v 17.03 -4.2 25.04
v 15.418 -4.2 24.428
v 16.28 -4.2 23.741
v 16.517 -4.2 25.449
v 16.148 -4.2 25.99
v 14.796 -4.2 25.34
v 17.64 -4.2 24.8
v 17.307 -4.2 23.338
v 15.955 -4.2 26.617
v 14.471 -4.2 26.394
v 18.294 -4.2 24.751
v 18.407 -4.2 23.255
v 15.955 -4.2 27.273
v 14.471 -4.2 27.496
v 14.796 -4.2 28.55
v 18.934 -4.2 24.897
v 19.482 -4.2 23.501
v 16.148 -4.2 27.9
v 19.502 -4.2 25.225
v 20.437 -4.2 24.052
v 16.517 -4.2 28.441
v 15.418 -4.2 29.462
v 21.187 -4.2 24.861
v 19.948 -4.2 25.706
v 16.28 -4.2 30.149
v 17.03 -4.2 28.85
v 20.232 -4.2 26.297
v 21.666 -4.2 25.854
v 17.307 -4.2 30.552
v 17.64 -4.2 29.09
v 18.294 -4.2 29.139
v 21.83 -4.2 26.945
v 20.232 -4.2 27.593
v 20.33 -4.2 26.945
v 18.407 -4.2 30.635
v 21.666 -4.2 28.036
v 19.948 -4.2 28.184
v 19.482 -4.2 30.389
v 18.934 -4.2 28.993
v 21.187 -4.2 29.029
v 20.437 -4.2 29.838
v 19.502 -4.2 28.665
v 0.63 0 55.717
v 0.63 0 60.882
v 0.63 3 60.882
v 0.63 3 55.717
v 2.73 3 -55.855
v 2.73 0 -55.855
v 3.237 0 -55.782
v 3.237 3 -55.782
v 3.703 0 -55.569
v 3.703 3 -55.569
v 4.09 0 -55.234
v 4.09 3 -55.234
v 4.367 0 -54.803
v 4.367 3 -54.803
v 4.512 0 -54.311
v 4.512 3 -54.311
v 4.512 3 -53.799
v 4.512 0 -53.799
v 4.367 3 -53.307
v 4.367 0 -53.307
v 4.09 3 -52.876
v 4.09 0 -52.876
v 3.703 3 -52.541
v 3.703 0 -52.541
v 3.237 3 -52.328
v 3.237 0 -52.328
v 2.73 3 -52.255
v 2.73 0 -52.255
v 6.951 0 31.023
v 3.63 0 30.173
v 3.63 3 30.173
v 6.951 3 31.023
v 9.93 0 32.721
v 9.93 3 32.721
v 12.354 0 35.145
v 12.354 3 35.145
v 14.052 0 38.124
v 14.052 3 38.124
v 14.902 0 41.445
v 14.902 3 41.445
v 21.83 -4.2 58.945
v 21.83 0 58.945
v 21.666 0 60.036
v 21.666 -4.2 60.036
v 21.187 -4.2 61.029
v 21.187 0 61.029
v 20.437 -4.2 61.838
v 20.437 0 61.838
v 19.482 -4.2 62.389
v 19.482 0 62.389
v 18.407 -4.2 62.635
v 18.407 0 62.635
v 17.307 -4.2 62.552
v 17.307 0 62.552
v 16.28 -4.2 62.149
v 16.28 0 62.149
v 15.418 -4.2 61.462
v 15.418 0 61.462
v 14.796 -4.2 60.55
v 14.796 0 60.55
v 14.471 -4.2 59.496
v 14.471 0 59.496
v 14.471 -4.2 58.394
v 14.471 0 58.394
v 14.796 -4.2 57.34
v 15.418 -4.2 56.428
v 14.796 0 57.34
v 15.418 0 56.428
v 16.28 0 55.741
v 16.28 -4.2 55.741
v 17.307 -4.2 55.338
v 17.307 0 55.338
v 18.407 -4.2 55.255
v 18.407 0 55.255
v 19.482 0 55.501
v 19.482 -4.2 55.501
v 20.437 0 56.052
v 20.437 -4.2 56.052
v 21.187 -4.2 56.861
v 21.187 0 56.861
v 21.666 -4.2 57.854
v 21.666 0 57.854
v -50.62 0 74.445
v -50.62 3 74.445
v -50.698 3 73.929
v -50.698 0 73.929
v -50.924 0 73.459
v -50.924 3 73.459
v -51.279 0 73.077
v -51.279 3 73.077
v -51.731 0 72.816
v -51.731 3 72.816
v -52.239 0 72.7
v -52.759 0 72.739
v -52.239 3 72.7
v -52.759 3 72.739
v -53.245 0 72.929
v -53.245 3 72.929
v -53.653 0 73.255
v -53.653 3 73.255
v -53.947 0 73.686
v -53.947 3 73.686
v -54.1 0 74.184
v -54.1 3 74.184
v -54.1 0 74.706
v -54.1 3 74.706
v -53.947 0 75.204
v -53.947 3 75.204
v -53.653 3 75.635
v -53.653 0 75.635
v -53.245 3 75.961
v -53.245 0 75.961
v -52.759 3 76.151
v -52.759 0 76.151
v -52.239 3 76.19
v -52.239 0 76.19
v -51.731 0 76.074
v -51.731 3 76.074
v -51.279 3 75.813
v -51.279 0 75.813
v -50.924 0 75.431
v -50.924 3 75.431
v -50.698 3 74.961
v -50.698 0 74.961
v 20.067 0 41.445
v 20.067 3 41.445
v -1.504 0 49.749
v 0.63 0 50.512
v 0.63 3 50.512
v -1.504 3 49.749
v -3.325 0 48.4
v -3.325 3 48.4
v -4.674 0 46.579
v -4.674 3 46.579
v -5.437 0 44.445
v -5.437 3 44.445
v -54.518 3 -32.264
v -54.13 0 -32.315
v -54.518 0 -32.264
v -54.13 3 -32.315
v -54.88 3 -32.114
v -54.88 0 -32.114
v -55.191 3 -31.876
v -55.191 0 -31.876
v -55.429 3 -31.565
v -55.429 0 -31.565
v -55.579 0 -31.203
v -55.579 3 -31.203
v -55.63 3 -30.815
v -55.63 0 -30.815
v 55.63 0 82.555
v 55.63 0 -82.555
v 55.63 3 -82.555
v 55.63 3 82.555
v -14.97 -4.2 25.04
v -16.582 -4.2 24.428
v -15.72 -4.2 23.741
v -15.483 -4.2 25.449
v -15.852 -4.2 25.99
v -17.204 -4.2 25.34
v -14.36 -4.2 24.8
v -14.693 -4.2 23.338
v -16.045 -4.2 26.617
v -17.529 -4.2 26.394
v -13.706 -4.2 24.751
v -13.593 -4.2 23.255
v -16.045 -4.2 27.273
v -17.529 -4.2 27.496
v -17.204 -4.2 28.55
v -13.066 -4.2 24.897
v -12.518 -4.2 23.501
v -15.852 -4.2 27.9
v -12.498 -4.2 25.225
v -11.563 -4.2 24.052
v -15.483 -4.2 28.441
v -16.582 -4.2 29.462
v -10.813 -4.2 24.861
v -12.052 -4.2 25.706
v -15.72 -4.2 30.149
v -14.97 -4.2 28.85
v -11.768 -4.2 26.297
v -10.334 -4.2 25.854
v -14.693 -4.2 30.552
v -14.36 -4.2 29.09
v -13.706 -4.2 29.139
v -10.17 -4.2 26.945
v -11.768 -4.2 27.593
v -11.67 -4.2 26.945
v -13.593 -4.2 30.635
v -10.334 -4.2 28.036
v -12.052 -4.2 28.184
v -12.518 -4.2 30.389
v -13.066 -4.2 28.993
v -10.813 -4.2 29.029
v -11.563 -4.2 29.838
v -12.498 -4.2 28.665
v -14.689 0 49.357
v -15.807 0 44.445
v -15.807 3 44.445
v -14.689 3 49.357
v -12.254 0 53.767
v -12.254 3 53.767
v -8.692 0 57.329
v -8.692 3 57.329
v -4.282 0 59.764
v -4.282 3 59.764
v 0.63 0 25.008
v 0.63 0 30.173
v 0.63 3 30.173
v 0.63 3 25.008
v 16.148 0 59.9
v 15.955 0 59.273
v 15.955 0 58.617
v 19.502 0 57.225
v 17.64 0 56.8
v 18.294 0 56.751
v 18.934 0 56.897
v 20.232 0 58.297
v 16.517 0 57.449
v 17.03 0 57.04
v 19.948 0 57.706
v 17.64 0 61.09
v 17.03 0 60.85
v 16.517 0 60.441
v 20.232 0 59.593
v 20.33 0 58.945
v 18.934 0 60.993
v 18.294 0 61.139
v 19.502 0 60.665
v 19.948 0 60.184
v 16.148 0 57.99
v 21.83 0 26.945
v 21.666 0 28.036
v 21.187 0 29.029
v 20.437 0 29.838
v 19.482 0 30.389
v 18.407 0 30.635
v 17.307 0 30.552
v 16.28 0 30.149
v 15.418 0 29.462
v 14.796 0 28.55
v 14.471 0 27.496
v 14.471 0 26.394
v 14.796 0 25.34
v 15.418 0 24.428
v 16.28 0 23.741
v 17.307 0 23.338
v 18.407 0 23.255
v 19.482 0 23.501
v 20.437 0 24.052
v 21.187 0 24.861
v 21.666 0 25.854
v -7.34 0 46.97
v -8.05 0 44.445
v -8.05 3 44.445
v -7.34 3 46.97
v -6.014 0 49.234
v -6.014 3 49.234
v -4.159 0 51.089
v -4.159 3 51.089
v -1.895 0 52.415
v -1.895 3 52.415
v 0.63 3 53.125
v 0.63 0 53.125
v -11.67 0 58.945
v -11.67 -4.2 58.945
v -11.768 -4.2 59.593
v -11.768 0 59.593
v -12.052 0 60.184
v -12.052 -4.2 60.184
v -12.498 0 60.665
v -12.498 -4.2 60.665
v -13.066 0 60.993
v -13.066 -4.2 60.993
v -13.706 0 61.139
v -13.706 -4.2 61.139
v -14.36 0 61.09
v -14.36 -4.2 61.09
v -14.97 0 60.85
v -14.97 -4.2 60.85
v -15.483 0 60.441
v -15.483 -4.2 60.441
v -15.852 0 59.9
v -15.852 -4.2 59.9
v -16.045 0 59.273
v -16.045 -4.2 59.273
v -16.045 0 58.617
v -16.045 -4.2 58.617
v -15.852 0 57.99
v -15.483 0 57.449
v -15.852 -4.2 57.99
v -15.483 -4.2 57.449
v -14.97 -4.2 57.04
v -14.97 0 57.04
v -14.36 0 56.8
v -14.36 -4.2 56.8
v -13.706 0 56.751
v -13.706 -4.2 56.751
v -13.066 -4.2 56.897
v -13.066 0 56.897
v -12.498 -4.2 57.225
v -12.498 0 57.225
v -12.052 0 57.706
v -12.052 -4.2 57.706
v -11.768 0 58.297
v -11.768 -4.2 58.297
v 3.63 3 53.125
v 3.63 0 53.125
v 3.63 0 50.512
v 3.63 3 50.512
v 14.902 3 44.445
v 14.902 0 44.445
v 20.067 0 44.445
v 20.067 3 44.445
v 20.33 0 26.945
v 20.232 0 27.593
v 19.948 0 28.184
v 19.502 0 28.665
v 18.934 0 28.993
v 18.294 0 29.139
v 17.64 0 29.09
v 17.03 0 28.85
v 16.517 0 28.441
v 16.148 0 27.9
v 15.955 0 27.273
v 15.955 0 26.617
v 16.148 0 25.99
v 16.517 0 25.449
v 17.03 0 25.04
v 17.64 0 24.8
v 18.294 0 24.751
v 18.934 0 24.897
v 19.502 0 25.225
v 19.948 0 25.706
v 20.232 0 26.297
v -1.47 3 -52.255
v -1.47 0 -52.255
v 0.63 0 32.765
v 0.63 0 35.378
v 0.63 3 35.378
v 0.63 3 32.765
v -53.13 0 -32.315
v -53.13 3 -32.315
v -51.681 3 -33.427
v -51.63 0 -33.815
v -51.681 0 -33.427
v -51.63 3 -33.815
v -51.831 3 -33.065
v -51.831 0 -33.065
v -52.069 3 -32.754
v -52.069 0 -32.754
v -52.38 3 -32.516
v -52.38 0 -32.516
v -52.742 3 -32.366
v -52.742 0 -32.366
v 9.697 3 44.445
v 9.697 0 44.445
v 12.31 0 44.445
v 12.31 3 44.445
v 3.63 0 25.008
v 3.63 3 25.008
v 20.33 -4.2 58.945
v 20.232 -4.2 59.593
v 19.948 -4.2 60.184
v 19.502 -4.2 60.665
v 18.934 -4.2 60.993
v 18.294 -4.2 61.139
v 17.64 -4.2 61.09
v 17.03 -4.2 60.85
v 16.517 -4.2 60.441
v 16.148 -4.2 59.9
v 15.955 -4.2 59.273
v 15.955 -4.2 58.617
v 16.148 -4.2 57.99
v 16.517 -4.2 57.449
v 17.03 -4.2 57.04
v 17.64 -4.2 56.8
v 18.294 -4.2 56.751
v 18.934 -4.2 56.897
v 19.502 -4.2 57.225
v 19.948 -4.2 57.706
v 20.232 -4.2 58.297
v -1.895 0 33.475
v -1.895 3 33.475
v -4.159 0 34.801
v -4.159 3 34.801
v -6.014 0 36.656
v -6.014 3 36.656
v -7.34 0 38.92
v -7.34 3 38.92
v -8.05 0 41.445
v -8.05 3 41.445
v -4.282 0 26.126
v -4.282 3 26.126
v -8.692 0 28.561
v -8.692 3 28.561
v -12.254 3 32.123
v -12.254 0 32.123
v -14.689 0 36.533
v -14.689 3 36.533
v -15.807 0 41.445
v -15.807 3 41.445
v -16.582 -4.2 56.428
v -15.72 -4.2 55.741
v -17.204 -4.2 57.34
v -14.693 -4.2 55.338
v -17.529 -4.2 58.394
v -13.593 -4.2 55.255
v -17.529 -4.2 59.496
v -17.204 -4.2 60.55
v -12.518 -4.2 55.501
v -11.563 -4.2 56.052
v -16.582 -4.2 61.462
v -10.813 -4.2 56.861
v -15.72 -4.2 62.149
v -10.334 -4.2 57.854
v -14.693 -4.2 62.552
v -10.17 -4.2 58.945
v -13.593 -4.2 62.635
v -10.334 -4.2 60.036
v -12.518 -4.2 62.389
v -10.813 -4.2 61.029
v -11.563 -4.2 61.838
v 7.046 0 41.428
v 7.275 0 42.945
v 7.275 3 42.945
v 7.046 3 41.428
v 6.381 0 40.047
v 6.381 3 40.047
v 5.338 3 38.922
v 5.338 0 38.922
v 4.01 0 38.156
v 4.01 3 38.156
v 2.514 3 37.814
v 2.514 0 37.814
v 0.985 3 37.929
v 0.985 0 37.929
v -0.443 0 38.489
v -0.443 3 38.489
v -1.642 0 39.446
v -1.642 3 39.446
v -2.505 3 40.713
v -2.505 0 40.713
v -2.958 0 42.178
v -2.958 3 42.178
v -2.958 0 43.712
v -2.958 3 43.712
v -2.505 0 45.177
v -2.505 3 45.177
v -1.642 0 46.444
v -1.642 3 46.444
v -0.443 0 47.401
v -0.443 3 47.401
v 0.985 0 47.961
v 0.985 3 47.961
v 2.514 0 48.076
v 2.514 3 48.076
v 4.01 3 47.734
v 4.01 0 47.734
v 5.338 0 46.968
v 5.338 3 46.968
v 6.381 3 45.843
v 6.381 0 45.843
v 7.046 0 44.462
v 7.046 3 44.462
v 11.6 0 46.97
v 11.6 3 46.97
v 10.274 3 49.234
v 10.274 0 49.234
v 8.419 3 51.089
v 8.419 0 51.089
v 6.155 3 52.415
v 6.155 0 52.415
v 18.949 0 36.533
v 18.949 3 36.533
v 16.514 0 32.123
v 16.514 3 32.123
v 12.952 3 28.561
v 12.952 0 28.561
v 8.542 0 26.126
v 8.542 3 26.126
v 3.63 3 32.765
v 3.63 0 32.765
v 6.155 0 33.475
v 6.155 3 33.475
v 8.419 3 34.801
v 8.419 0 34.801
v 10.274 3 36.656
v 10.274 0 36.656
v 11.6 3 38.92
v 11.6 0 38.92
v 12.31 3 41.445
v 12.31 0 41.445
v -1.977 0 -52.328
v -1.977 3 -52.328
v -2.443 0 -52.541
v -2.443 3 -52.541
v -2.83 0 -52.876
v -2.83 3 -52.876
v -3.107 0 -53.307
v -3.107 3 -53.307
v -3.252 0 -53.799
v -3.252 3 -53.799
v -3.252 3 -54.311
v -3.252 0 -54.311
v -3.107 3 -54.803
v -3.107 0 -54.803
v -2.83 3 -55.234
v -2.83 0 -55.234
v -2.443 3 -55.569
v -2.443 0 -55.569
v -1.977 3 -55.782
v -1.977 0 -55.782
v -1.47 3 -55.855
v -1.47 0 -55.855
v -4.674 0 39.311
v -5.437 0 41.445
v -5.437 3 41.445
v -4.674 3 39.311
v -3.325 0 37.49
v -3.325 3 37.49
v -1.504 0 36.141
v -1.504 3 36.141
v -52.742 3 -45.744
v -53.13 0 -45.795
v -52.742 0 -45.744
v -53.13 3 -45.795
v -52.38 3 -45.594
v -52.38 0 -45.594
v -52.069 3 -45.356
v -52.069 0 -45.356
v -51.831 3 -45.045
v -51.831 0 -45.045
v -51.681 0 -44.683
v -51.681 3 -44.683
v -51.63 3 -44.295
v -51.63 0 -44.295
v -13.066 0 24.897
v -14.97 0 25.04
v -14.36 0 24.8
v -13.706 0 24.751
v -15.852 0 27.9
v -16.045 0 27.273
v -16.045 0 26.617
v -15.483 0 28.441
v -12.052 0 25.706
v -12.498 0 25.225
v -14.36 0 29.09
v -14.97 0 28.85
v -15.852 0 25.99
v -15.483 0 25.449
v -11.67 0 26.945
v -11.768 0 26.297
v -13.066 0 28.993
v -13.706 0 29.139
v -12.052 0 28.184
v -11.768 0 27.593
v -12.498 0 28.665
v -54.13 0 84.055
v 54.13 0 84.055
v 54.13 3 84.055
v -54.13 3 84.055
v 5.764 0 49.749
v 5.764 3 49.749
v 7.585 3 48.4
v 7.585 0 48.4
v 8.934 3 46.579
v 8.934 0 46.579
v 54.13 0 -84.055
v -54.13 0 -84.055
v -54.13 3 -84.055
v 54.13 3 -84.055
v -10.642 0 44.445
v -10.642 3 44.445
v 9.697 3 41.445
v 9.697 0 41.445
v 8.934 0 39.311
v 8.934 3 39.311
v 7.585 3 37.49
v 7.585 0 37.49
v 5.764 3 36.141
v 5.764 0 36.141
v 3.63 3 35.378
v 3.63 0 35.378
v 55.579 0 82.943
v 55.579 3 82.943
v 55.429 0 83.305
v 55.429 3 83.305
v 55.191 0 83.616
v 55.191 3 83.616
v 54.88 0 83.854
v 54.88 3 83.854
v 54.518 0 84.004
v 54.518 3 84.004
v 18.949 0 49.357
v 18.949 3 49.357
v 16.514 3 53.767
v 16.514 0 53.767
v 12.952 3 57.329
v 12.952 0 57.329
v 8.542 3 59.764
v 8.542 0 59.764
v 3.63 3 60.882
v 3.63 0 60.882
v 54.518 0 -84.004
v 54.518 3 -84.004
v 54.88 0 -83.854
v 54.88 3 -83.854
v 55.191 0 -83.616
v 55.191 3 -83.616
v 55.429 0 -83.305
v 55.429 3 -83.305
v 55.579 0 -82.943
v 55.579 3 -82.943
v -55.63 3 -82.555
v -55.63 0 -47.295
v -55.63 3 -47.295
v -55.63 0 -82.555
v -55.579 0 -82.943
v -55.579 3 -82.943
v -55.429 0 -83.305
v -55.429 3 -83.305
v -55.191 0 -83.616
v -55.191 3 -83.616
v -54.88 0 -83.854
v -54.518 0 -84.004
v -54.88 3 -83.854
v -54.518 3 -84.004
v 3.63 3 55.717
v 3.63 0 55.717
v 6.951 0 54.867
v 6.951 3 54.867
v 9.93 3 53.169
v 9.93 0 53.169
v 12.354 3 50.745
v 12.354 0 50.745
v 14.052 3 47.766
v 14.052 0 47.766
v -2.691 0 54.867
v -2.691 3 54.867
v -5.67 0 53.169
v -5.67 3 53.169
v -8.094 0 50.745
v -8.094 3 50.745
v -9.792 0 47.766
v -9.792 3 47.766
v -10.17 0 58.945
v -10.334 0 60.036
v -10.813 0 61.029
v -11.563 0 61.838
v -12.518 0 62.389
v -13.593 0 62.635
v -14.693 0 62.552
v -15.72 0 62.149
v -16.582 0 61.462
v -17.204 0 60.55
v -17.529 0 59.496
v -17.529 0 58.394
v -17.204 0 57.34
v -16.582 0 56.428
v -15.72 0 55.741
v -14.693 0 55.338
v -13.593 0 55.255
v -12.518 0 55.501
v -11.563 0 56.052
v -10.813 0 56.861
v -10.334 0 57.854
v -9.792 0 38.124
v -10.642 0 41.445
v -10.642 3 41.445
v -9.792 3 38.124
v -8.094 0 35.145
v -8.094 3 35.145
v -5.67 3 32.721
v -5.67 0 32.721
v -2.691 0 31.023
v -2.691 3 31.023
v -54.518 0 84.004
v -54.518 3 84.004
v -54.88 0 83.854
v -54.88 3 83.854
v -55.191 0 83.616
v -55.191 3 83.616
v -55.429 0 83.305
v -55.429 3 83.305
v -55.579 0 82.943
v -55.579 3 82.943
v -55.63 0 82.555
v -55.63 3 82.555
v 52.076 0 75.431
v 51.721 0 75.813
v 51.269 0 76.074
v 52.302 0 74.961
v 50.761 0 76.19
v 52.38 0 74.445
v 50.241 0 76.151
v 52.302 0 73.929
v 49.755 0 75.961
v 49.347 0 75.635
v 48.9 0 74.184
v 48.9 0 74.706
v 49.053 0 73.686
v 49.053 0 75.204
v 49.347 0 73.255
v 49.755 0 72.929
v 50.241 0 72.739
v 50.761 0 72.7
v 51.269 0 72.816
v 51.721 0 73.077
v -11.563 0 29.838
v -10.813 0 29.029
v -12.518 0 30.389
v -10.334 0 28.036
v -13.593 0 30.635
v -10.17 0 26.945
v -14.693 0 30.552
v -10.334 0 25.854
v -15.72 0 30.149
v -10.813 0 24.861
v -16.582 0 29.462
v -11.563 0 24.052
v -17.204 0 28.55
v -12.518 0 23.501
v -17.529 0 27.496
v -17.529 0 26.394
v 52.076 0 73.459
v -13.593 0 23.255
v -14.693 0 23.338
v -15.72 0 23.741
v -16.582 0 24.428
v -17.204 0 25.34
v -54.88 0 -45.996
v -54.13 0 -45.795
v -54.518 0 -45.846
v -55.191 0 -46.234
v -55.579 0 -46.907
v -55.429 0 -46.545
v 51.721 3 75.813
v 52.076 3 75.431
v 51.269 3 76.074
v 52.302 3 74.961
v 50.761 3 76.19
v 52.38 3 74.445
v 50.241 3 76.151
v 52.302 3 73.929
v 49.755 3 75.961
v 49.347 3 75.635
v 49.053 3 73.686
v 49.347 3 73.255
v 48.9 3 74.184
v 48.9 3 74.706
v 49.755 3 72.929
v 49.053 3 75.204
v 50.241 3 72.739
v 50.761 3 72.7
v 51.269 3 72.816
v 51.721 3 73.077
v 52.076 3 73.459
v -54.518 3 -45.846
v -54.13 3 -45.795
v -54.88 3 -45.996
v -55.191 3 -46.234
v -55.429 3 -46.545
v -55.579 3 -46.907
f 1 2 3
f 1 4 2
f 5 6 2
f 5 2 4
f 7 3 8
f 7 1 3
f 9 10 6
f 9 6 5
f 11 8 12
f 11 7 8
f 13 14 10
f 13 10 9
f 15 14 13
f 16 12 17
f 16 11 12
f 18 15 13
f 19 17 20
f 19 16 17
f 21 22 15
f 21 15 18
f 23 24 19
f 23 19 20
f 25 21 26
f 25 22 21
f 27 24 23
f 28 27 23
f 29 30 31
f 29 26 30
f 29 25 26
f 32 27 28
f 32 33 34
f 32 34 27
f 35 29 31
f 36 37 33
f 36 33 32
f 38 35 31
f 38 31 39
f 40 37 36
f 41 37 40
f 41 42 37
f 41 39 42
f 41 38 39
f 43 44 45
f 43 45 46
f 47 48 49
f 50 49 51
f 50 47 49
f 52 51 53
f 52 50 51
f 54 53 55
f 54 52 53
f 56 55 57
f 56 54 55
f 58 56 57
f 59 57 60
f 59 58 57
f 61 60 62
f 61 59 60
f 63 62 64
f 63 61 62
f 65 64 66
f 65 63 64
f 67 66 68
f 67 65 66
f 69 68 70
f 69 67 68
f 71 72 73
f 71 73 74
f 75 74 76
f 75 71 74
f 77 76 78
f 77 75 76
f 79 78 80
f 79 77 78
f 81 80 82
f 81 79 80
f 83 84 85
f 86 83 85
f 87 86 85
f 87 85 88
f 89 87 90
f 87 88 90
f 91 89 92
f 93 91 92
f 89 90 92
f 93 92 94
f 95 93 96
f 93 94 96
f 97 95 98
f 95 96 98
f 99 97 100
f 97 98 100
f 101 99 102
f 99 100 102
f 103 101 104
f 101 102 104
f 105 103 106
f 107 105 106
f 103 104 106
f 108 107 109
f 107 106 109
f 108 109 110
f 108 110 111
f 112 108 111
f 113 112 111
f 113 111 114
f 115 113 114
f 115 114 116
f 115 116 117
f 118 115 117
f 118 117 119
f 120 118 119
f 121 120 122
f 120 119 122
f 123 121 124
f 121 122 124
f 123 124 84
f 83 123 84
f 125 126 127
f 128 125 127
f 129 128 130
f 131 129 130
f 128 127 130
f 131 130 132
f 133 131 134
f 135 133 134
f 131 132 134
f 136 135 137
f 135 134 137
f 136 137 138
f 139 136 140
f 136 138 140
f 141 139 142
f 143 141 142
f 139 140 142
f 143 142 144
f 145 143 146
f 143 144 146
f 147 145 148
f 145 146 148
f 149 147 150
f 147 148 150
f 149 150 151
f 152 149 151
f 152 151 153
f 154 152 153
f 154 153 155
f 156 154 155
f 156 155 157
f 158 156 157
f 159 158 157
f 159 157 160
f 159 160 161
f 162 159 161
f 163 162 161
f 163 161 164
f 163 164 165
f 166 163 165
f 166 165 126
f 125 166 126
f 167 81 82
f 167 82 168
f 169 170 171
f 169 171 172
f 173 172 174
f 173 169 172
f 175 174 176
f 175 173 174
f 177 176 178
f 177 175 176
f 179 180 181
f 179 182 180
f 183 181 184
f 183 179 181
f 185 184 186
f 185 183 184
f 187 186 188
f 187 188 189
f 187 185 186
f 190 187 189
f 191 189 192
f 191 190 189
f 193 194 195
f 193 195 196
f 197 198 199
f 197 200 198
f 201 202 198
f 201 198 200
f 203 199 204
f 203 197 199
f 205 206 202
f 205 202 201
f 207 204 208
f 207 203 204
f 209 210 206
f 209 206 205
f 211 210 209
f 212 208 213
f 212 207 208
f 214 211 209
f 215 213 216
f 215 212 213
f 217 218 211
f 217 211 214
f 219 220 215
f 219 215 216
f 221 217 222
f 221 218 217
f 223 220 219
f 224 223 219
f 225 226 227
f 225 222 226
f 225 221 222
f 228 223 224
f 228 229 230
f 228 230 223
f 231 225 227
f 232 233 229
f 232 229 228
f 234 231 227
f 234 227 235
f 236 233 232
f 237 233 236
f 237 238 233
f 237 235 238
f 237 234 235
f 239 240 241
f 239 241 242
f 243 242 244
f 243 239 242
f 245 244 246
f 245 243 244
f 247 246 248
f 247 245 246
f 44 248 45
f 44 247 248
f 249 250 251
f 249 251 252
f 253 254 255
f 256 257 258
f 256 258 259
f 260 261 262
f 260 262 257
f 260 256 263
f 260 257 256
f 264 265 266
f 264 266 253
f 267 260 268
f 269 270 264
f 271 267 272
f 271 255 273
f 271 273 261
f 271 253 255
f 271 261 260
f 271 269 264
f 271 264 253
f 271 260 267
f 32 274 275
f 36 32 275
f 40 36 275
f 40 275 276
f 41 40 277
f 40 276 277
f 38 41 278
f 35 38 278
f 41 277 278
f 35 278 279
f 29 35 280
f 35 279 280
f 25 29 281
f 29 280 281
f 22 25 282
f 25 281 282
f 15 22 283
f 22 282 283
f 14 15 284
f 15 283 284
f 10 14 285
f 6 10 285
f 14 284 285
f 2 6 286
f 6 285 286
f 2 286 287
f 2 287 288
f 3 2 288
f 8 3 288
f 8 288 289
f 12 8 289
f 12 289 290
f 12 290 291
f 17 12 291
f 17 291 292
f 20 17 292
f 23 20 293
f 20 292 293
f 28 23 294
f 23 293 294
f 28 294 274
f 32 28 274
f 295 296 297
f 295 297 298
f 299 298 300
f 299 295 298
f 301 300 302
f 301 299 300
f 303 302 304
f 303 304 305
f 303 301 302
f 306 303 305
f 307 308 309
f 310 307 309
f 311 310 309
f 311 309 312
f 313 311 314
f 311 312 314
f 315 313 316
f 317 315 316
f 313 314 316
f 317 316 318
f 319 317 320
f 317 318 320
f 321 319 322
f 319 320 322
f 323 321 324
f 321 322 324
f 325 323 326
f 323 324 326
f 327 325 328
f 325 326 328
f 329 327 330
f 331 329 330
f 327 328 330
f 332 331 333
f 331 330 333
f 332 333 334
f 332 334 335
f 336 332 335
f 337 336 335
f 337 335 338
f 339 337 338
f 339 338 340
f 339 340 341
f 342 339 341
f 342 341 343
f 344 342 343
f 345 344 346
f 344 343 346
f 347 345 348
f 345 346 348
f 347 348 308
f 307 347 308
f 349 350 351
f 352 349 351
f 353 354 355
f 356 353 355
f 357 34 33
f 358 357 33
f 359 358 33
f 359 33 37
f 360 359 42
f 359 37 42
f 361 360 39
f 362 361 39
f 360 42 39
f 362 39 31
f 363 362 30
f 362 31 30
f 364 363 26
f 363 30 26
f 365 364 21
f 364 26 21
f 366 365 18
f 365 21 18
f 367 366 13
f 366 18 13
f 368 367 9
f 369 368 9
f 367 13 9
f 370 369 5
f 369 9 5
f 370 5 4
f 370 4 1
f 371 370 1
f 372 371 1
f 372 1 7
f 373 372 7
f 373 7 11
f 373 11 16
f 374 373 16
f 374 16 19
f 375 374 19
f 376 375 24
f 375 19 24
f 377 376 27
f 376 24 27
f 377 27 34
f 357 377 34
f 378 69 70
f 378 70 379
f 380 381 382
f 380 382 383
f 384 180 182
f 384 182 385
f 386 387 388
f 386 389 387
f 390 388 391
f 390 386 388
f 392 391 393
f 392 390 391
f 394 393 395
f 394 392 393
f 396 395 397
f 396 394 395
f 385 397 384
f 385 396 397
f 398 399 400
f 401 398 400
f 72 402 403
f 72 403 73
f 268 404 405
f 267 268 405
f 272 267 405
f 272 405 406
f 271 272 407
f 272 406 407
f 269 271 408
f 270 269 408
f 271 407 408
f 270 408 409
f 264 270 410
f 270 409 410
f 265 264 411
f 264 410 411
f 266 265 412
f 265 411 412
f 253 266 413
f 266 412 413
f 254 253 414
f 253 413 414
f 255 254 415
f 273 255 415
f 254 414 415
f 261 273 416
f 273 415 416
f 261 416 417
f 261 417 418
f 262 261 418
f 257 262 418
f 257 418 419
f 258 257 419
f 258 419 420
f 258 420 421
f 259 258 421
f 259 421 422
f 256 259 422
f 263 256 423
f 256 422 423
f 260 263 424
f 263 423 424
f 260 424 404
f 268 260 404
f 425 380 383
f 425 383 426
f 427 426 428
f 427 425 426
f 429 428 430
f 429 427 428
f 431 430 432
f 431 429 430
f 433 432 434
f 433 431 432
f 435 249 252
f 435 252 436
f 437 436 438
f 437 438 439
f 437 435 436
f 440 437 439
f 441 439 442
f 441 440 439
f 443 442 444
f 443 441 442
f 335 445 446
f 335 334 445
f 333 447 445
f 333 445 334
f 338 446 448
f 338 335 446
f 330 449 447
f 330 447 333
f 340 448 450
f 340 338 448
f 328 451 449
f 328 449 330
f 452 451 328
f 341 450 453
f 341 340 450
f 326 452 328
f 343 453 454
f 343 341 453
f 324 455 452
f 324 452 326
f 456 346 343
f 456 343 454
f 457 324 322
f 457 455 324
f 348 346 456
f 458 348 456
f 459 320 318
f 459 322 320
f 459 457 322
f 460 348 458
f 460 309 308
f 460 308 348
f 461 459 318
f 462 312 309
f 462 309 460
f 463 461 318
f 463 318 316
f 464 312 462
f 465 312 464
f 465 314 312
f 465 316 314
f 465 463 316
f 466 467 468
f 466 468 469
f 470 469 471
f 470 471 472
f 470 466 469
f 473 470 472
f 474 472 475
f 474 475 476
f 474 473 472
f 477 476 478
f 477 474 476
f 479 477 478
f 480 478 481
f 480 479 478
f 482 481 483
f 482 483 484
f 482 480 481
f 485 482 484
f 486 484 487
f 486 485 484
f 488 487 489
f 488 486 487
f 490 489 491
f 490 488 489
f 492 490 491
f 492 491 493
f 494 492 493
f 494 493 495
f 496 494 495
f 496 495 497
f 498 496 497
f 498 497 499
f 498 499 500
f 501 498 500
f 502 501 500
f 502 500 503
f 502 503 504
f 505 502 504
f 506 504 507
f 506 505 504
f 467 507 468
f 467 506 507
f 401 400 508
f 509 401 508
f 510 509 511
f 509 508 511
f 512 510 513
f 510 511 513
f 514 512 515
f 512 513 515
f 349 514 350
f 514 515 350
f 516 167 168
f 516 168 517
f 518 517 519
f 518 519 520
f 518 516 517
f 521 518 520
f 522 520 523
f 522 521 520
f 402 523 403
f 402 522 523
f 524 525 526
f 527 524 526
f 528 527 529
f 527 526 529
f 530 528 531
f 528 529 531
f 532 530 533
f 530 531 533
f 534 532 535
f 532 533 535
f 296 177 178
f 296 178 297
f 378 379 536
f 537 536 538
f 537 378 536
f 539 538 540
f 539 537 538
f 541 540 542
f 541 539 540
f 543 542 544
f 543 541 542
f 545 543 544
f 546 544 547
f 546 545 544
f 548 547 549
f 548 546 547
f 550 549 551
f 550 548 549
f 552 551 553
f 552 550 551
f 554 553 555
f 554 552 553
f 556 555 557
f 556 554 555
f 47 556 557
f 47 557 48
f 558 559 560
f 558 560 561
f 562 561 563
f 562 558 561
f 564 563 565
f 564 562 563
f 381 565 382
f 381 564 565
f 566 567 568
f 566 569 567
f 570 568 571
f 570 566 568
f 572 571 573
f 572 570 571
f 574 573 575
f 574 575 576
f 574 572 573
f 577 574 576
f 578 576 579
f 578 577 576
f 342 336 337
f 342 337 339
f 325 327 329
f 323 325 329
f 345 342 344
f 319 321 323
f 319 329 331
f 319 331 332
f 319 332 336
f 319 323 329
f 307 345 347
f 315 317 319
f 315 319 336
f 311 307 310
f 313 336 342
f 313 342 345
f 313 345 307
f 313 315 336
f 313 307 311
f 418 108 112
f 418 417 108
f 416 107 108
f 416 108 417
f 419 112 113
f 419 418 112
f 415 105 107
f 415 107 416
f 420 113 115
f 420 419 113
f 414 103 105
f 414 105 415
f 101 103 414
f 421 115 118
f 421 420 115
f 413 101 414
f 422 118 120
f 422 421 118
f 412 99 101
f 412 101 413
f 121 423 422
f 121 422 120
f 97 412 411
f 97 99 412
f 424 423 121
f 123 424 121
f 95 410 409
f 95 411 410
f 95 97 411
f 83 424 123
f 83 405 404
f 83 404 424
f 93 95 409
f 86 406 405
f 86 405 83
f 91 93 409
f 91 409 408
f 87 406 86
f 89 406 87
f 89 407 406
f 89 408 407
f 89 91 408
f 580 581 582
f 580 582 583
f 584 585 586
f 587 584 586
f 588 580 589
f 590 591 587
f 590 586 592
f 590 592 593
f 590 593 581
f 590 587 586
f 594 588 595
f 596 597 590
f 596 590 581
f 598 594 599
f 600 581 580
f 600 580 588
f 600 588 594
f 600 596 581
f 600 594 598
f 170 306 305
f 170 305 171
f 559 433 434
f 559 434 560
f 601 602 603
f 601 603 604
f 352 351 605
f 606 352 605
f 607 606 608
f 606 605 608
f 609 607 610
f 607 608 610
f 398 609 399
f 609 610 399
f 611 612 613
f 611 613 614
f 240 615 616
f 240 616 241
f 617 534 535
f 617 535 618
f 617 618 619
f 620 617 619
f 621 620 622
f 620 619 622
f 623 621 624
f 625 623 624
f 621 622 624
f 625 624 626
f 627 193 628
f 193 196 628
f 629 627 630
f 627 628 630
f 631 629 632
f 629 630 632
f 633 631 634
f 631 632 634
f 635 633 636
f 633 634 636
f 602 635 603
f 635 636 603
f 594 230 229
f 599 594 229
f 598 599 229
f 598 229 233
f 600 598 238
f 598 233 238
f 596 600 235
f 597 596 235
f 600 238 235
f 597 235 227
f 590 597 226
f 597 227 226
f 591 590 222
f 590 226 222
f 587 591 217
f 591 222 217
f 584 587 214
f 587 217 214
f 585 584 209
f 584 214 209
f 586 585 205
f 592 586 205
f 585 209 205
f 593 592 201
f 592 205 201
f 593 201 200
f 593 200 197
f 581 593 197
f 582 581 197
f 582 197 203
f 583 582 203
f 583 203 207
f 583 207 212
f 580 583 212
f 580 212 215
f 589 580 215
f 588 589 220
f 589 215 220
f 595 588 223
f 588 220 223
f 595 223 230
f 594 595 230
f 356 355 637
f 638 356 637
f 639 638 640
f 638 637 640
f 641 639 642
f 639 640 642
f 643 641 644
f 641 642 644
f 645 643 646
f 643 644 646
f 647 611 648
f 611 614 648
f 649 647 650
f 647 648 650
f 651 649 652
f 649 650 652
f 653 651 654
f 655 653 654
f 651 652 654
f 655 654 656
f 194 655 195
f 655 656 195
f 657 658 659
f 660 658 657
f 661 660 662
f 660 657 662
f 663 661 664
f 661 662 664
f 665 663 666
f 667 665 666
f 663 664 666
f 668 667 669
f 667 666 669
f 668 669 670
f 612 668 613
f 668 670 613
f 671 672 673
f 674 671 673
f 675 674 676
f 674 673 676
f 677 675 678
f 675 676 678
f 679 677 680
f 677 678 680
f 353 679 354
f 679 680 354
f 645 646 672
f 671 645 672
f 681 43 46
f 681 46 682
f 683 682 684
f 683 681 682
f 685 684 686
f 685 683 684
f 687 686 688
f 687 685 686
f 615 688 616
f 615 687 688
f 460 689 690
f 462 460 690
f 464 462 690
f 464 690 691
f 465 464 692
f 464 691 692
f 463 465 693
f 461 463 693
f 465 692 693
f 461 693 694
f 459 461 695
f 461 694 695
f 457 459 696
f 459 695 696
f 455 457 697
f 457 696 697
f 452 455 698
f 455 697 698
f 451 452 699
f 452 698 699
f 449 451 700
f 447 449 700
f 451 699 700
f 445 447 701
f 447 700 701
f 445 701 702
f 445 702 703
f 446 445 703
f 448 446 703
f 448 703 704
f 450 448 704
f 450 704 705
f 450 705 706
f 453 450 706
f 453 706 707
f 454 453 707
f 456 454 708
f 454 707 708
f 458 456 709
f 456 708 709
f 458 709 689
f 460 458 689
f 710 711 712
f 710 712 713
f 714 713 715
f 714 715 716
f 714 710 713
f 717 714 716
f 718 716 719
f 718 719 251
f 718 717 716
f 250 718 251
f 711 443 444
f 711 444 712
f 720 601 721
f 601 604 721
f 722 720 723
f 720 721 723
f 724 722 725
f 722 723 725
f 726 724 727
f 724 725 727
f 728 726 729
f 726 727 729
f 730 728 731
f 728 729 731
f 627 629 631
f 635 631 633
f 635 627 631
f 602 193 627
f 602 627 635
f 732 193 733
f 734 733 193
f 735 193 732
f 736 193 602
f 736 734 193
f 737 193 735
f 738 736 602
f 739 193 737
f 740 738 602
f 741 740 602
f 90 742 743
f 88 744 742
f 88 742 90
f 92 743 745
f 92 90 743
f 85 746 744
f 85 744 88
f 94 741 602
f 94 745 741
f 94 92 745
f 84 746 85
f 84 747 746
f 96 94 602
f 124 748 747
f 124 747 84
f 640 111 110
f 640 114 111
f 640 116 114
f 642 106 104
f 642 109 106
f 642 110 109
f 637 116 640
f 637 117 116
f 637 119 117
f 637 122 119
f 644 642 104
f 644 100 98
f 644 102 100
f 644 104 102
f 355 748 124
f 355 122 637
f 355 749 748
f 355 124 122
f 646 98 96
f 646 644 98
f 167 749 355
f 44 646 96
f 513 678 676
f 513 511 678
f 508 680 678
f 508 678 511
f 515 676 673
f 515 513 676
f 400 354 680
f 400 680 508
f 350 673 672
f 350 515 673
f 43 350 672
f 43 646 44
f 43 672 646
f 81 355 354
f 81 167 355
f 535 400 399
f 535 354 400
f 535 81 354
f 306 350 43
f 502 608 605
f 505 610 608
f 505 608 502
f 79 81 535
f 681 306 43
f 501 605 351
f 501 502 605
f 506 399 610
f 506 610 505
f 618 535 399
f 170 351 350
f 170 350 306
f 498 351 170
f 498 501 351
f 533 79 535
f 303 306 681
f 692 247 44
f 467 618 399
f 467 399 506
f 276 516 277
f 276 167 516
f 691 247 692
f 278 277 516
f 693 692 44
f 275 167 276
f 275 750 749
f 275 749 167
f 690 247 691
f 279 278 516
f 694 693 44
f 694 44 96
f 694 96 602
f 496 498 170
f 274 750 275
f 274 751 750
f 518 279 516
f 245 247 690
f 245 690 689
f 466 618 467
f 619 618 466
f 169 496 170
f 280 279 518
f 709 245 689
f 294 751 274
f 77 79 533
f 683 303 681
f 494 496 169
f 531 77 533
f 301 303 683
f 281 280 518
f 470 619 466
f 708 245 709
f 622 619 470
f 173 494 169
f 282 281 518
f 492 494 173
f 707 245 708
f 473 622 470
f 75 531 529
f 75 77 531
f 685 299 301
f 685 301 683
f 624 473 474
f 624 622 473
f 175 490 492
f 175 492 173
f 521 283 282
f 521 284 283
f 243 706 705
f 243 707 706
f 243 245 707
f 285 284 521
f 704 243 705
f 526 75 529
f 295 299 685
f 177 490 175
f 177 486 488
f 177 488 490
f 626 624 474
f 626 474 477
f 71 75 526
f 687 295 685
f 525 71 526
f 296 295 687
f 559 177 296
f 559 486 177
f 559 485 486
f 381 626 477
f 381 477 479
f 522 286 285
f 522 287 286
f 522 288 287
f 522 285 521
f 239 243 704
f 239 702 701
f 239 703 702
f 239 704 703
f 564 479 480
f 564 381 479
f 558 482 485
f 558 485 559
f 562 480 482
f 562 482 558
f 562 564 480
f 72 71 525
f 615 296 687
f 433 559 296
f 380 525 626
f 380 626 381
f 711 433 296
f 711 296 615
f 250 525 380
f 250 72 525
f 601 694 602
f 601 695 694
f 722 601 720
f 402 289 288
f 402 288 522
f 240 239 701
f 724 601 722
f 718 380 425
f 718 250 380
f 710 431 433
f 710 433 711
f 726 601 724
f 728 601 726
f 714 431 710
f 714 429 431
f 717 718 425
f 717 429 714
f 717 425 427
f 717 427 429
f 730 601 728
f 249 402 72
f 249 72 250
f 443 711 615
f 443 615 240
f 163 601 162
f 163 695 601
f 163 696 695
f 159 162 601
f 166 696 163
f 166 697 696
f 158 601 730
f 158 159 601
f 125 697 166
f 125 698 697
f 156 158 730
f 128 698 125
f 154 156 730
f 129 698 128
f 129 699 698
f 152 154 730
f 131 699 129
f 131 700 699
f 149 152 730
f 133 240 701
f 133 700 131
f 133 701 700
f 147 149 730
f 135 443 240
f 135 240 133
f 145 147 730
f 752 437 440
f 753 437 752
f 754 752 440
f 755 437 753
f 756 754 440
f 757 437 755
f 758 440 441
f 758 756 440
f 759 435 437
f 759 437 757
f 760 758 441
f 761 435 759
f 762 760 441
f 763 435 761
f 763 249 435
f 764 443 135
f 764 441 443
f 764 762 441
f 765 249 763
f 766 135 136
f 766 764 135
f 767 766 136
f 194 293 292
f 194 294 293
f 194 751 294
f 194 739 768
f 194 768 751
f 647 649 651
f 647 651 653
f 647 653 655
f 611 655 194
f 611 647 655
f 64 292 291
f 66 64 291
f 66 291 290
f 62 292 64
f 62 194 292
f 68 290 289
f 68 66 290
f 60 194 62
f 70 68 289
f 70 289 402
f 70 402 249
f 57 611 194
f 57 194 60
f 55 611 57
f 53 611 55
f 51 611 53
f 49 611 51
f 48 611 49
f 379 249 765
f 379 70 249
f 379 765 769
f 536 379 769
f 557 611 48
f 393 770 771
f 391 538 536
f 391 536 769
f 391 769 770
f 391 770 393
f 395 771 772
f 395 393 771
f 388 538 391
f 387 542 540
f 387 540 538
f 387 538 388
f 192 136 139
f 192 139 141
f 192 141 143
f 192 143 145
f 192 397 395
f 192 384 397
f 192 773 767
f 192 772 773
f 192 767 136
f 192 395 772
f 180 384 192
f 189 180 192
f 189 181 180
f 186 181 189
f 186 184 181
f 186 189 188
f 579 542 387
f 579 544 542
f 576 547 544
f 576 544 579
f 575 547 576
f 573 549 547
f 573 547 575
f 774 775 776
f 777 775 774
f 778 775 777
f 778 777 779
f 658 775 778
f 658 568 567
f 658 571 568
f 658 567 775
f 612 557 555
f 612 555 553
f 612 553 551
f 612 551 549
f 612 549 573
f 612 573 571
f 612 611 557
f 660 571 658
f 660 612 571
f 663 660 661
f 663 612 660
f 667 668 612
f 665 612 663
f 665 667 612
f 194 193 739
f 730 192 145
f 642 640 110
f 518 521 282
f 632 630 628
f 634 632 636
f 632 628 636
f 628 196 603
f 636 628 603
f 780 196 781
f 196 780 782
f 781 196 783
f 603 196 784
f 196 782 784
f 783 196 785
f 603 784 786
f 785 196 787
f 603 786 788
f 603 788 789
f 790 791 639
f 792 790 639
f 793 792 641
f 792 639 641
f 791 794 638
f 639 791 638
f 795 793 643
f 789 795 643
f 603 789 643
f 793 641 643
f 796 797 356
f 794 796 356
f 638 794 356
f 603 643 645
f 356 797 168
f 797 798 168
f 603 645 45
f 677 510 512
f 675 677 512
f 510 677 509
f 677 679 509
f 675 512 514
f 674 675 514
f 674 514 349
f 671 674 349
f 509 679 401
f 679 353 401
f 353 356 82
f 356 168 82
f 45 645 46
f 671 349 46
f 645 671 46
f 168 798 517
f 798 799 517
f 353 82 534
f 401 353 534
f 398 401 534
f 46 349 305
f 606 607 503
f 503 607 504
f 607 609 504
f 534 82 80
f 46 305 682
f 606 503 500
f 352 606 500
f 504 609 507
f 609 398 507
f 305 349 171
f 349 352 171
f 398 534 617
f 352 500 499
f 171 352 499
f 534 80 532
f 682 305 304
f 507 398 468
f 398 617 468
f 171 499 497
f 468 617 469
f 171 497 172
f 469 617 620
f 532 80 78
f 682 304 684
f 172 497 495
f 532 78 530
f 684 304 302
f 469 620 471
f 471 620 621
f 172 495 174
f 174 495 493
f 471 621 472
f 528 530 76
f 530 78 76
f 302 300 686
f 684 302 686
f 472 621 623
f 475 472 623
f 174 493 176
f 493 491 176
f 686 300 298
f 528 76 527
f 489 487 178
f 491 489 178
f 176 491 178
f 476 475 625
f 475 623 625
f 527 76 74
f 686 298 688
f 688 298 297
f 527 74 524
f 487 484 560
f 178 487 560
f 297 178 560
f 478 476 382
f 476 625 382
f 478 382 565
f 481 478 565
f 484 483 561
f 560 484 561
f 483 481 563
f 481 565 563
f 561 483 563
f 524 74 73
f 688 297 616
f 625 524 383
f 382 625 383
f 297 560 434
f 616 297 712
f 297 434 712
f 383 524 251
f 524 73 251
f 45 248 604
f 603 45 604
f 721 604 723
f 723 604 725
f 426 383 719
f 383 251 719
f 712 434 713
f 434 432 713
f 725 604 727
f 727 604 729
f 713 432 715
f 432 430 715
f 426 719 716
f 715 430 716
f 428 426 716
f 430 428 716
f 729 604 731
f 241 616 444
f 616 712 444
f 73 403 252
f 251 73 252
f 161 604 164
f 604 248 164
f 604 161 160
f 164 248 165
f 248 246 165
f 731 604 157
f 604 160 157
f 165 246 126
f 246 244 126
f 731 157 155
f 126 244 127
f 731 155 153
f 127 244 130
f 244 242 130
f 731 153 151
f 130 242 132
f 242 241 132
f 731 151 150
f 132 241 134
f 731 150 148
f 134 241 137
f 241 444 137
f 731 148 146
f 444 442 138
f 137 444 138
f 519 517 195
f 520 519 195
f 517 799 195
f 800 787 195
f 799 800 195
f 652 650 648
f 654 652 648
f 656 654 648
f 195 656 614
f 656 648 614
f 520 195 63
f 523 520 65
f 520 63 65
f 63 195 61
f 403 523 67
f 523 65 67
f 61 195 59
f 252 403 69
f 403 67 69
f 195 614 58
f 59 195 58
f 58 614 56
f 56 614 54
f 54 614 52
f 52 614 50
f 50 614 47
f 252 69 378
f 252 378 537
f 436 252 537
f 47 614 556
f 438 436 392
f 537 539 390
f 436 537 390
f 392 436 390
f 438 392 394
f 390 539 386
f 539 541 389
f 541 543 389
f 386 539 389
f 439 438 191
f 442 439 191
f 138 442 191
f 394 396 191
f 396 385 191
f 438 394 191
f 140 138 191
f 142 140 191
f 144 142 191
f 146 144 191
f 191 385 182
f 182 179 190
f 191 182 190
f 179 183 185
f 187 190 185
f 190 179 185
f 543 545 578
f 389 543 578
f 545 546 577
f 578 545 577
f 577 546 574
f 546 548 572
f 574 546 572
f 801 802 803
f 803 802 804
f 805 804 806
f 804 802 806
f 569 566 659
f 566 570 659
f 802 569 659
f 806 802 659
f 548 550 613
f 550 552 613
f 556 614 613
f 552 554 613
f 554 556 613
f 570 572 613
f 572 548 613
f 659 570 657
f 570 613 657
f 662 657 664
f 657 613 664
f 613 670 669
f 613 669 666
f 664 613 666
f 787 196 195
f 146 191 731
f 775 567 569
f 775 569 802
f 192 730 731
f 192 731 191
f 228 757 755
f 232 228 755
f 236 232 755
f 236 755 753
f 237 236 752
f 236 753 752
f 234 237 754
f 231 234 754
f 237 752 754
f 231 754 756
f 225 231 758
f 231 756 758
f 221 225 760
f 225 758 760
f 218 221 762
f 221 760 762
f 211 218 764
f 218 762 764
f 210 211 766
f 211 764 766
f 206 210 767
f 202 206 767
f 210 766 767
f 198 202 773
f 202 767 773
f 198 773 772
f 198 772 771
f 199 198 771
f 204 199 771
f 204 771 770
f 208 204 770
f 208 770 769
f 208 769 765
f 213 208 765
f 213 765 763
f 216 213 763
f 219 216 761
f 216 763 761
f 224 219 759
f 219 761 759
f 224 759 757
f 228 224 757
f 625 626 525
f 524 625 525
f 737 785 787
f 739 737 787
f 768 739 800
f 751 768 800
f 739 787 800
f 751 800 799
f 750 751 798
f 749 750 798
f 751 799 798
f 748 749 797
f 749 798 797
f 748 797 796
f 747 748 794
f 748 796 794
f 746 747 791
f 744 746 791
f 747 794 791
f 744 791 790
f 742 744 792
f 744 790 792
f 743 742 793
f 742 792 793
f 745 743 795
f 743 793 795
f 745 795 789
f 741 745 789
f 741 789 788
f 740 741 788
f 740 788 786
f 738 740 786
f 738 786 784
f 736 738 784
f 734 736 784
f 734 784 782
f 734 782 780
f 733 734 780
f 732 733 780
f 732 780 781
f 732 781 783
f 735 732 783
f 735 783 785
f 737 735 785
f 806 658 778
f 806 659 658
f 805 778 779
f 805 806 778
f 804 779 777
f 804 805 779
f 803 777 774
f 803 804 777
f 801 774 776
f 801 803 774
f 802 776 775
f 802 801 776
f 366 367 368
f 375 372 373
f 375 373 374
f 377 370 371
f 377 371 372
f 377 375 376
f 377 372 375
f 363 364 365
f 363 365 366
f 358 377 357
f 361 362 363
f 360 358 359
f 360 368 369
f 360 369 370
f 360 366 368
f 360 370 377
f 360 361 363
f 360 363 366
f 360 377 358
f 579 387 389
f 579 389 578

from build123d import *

# Parameters (mm, degrees)
ESBO_O1_R                = 5.145
RESSALTO_EXTRUS_O1_DEPTH = 3
ESBO_O2_R                = 1.75
CORTE_EXTRUS_O1_DEPTH    = 4
FILETE1_R                = 1.5
ESBO_O3_R                = 3.7
RESSALTO_EXTRUS_O2_DEPTH = 4.2
ESBO_O4_R                = 2.2
CORTE_EXTRUS_O2_DEPTH    = 4.2


with BuildPart() as part:
    # Esboço1 → Ressalto-extrusão1 (new body)
    with BuildSketch(Plane(origin=(0, 0, 0), x_dir=(1, 0, 0), z_dir=(0, 1, 0))):
        Polygon((-55.63, 45.795), (-55.63, 84.055), (55.63, 84.055), (55.63, -84.055), (-55.63, -84.055), (-55.63, 32.315), (-51.63, 32.315), (-51.63, 45.795), align=None)
        with Locations((2.13, -42.945)):
            Circle(ESBO_O1_R, mode=Mode.SUBTRACT)
        with BuildLine():
            Line((0.63, -53.125083497), (0.63, -50.511755976))
            ThreePointArc((0.63, -50.511755976), (-3.32462171, -48.39962171), (-5.436755976, -44.445))
            Line((-5.436755976, -44.445), (-8.050083497, -44.445))
            ThreePointArc((-8.050083497, -44.445), (-5.146128778, -50.221128778), (0.63, -53.125083497))
        make_face(mode=Mode.SUBTRACT)
        with BuildLine():
            Line((0.63, -60.882391115), (0.63, -55.717219854))
            ThreePointArc((0.63, -55.717219854), (-6.963393206, -52.038393206), (-10.642219854, -44.445))
            Line((-10.642219854, -44.445), (-15.807391115, -44.445))
            ThreePointArc((-15.807391115, -44.445), (-10.597922061, -55.672922061), (0.63, -60.882391115))
        make_face(mode=Mode.SUBTRACT)
        with BuildLine():
            Line((3.63, -60.882391115), (3.63, -55.717219854))
            ThreePointArc((3.63, -55.717219854), (11.223393206, -52.038393206), (14.902219854, -44.445))
            Line((14.902219854, -44.445), (20.067391115, -44.445))
            ThreePointArc((20.067391115, -44.445), (14.857922061, -55.672922061), (3.63, -60.882391115))
        make_face(mode=Mode.SUBTRACT)
        with BuildLine():
            Line((3.63, -53.125083497), (3.63, -50.511755976))
            ThreePointArc((3.63, -50.511755976), (7.58462171, -48.39962171), (9.696755976, -44.445))
            Line((9.696755976, -44.445), (12.310083497, -44.445))
            ThreePointArc((12.310083497, -44.445), (9.406128778, -50.221128778), (3.63, -53.125083497))
        make_face(mode=Mode.SUBTRACT)
        with BuildLine():
            Line((14.902219854, -41.445), (20.067391115, -41.445))
            ThreePointArc((20.067391115, -41.445), (14.857922061, -30.217077939), (3.63, -25.007608885))
            Line((3.63, -25.007608885), (3.63, -30.172780146))
            ThreePointArc((3.63, -30.172780146), (11.223393206, -33.851606794), (14.902219854, -41.445))
        make_face(mode=Mode.SUBTRACT)
        with BuildLine():
            Line((-15.807391115, -41.445), (-10.642219854, -41.445))
            ThreePointArc((-10.642219854, -41.445), (-6.963393206, -33.851606794), (0.63, -30.172780146))
            Line((0.63, -30.172780146), (0.63, -25.007608885))
            ThreePointArc((0.63, -25.007608885), (-10.597922061, -30.217077939), (-15.807391115, -41.445))
        make_face(mode=Mode.SUBTRACT)
        with BuildLine():
            Line((-8.050083497, -41.445), (-5.436755976, -41.445))
            ThreePointArc((-5.436755976, -41.445), (-3.32462171, -37.49037829), (0.63, -35.378244024))
            Line((0.63, -35.378244024), (0.63, -32.764916503))
            ThreePointArc((0.63, -32.764916503), (-5.146128778, -35.668871222), (-8.050083497, -41.445))
        make_face(mode=Mode.SUBTRACT)
        with BuildLine():
            Line((3.63, -35.378244024), (3.63, -32.764916503))
            ThreePointArc((3.63, -32.764916503), (9.406128778, -35.668871222), (12.310083497, -41.445))
            Line((12.310083497, -41.445), (9.696755976, -41.445))
            ThreePointArc((9.696755976, -41.445), (7.58462171, -37.49037829), (3.63, -35.378244024))
        make_face(mode=Mode.SUBTRACT)
    extrude(amount=RESSALTO_EXTRUS_O1_DEPTH)

    # Esboço2 → Corte-extrusão1 (cut, through all)
    with BuildSketch(Plane(origin=(0, 3, 0), x_dir=(1, 0, 0), z_dir=(0, 1, 0))):
        with Locations((-52.37, -74.445)):
            Circle(ESBO_O2_R)
        with Locations((50.63, -74.445)):
            Circle(ESBO_O2_R)
        with BuildLine():
            Line((-1.47, 55.855), (2.73, 55.855))
            ThreePointArc((2.73, 55.855), (4.53, 54.055), (2.73, 52.255))
            Line((2.73, 52.255), (-1.47, 52.255))
            ThreePointArc((-1.47, 52.255), (-3.27, 54.055), (-1.47, 55.855))
        make_face()
    extrude(amount=-CORTE_EXTRUS_O1_DEPTH, mode=Mode.SUBTRACT)

    # Filete1
    filete1_edges = [part.edges().sort_by_distance(p)[0] for p in [
        (-51.63, 1.5, -45.795),
        (-55.63, 1.5, -45.795),
        (-55.63, 1.5, -84.055),
        (55.63, 1.5, -84.055),
        (55.63, 1.5, 84.055),
        (-55.63, 1.5, 84.055),
        (-55.63, 1.5, -32.315),
        (-51.63, 1.5, -32.315),
    ]]
    fillet(filete1_edges, radius=FILETE1_R)

    # Esboço3 → Ressalto-extrusão2 (add)
    with BuildSketch(Plane.XZ):
        with Locations((18.13, 26.945)):
            Circle(ESBO_O3_R)
        with Locations((18.13, 58.945)):
            Circle(ESBO_O3_R)
        with Locations((-13.87, 58.945)):
            Circle(ESBO_O3_R)
        with Locations((-13.87, 26.945)):
            Circle(ESBO_O3_R)
    extrude(amount=RESSALTO_EXTRUS_O2_DEPTH)

    # Esboço4 → Corte-extrusão2 (cut)
    with BuildSketch(Plane.XZ.offset(4.2)):
        with Locations((-13.87, 58.945)):
            Circle(ESBO_O4_R)
        with Locations((18.13, 58.945)):
            Circle(ESBO_O4_R)
        with Locations((18.13, 26.945)):
            Circle(ESBO_O4_R)
        with Locations((-13.87, 26.945)):
            Circle(ESBO_O4_R)
    extrude(amount=-CORTE_EXTRUS_O2_DEPTH, mode=Mode.SUBTRACT)


solid = part.part
